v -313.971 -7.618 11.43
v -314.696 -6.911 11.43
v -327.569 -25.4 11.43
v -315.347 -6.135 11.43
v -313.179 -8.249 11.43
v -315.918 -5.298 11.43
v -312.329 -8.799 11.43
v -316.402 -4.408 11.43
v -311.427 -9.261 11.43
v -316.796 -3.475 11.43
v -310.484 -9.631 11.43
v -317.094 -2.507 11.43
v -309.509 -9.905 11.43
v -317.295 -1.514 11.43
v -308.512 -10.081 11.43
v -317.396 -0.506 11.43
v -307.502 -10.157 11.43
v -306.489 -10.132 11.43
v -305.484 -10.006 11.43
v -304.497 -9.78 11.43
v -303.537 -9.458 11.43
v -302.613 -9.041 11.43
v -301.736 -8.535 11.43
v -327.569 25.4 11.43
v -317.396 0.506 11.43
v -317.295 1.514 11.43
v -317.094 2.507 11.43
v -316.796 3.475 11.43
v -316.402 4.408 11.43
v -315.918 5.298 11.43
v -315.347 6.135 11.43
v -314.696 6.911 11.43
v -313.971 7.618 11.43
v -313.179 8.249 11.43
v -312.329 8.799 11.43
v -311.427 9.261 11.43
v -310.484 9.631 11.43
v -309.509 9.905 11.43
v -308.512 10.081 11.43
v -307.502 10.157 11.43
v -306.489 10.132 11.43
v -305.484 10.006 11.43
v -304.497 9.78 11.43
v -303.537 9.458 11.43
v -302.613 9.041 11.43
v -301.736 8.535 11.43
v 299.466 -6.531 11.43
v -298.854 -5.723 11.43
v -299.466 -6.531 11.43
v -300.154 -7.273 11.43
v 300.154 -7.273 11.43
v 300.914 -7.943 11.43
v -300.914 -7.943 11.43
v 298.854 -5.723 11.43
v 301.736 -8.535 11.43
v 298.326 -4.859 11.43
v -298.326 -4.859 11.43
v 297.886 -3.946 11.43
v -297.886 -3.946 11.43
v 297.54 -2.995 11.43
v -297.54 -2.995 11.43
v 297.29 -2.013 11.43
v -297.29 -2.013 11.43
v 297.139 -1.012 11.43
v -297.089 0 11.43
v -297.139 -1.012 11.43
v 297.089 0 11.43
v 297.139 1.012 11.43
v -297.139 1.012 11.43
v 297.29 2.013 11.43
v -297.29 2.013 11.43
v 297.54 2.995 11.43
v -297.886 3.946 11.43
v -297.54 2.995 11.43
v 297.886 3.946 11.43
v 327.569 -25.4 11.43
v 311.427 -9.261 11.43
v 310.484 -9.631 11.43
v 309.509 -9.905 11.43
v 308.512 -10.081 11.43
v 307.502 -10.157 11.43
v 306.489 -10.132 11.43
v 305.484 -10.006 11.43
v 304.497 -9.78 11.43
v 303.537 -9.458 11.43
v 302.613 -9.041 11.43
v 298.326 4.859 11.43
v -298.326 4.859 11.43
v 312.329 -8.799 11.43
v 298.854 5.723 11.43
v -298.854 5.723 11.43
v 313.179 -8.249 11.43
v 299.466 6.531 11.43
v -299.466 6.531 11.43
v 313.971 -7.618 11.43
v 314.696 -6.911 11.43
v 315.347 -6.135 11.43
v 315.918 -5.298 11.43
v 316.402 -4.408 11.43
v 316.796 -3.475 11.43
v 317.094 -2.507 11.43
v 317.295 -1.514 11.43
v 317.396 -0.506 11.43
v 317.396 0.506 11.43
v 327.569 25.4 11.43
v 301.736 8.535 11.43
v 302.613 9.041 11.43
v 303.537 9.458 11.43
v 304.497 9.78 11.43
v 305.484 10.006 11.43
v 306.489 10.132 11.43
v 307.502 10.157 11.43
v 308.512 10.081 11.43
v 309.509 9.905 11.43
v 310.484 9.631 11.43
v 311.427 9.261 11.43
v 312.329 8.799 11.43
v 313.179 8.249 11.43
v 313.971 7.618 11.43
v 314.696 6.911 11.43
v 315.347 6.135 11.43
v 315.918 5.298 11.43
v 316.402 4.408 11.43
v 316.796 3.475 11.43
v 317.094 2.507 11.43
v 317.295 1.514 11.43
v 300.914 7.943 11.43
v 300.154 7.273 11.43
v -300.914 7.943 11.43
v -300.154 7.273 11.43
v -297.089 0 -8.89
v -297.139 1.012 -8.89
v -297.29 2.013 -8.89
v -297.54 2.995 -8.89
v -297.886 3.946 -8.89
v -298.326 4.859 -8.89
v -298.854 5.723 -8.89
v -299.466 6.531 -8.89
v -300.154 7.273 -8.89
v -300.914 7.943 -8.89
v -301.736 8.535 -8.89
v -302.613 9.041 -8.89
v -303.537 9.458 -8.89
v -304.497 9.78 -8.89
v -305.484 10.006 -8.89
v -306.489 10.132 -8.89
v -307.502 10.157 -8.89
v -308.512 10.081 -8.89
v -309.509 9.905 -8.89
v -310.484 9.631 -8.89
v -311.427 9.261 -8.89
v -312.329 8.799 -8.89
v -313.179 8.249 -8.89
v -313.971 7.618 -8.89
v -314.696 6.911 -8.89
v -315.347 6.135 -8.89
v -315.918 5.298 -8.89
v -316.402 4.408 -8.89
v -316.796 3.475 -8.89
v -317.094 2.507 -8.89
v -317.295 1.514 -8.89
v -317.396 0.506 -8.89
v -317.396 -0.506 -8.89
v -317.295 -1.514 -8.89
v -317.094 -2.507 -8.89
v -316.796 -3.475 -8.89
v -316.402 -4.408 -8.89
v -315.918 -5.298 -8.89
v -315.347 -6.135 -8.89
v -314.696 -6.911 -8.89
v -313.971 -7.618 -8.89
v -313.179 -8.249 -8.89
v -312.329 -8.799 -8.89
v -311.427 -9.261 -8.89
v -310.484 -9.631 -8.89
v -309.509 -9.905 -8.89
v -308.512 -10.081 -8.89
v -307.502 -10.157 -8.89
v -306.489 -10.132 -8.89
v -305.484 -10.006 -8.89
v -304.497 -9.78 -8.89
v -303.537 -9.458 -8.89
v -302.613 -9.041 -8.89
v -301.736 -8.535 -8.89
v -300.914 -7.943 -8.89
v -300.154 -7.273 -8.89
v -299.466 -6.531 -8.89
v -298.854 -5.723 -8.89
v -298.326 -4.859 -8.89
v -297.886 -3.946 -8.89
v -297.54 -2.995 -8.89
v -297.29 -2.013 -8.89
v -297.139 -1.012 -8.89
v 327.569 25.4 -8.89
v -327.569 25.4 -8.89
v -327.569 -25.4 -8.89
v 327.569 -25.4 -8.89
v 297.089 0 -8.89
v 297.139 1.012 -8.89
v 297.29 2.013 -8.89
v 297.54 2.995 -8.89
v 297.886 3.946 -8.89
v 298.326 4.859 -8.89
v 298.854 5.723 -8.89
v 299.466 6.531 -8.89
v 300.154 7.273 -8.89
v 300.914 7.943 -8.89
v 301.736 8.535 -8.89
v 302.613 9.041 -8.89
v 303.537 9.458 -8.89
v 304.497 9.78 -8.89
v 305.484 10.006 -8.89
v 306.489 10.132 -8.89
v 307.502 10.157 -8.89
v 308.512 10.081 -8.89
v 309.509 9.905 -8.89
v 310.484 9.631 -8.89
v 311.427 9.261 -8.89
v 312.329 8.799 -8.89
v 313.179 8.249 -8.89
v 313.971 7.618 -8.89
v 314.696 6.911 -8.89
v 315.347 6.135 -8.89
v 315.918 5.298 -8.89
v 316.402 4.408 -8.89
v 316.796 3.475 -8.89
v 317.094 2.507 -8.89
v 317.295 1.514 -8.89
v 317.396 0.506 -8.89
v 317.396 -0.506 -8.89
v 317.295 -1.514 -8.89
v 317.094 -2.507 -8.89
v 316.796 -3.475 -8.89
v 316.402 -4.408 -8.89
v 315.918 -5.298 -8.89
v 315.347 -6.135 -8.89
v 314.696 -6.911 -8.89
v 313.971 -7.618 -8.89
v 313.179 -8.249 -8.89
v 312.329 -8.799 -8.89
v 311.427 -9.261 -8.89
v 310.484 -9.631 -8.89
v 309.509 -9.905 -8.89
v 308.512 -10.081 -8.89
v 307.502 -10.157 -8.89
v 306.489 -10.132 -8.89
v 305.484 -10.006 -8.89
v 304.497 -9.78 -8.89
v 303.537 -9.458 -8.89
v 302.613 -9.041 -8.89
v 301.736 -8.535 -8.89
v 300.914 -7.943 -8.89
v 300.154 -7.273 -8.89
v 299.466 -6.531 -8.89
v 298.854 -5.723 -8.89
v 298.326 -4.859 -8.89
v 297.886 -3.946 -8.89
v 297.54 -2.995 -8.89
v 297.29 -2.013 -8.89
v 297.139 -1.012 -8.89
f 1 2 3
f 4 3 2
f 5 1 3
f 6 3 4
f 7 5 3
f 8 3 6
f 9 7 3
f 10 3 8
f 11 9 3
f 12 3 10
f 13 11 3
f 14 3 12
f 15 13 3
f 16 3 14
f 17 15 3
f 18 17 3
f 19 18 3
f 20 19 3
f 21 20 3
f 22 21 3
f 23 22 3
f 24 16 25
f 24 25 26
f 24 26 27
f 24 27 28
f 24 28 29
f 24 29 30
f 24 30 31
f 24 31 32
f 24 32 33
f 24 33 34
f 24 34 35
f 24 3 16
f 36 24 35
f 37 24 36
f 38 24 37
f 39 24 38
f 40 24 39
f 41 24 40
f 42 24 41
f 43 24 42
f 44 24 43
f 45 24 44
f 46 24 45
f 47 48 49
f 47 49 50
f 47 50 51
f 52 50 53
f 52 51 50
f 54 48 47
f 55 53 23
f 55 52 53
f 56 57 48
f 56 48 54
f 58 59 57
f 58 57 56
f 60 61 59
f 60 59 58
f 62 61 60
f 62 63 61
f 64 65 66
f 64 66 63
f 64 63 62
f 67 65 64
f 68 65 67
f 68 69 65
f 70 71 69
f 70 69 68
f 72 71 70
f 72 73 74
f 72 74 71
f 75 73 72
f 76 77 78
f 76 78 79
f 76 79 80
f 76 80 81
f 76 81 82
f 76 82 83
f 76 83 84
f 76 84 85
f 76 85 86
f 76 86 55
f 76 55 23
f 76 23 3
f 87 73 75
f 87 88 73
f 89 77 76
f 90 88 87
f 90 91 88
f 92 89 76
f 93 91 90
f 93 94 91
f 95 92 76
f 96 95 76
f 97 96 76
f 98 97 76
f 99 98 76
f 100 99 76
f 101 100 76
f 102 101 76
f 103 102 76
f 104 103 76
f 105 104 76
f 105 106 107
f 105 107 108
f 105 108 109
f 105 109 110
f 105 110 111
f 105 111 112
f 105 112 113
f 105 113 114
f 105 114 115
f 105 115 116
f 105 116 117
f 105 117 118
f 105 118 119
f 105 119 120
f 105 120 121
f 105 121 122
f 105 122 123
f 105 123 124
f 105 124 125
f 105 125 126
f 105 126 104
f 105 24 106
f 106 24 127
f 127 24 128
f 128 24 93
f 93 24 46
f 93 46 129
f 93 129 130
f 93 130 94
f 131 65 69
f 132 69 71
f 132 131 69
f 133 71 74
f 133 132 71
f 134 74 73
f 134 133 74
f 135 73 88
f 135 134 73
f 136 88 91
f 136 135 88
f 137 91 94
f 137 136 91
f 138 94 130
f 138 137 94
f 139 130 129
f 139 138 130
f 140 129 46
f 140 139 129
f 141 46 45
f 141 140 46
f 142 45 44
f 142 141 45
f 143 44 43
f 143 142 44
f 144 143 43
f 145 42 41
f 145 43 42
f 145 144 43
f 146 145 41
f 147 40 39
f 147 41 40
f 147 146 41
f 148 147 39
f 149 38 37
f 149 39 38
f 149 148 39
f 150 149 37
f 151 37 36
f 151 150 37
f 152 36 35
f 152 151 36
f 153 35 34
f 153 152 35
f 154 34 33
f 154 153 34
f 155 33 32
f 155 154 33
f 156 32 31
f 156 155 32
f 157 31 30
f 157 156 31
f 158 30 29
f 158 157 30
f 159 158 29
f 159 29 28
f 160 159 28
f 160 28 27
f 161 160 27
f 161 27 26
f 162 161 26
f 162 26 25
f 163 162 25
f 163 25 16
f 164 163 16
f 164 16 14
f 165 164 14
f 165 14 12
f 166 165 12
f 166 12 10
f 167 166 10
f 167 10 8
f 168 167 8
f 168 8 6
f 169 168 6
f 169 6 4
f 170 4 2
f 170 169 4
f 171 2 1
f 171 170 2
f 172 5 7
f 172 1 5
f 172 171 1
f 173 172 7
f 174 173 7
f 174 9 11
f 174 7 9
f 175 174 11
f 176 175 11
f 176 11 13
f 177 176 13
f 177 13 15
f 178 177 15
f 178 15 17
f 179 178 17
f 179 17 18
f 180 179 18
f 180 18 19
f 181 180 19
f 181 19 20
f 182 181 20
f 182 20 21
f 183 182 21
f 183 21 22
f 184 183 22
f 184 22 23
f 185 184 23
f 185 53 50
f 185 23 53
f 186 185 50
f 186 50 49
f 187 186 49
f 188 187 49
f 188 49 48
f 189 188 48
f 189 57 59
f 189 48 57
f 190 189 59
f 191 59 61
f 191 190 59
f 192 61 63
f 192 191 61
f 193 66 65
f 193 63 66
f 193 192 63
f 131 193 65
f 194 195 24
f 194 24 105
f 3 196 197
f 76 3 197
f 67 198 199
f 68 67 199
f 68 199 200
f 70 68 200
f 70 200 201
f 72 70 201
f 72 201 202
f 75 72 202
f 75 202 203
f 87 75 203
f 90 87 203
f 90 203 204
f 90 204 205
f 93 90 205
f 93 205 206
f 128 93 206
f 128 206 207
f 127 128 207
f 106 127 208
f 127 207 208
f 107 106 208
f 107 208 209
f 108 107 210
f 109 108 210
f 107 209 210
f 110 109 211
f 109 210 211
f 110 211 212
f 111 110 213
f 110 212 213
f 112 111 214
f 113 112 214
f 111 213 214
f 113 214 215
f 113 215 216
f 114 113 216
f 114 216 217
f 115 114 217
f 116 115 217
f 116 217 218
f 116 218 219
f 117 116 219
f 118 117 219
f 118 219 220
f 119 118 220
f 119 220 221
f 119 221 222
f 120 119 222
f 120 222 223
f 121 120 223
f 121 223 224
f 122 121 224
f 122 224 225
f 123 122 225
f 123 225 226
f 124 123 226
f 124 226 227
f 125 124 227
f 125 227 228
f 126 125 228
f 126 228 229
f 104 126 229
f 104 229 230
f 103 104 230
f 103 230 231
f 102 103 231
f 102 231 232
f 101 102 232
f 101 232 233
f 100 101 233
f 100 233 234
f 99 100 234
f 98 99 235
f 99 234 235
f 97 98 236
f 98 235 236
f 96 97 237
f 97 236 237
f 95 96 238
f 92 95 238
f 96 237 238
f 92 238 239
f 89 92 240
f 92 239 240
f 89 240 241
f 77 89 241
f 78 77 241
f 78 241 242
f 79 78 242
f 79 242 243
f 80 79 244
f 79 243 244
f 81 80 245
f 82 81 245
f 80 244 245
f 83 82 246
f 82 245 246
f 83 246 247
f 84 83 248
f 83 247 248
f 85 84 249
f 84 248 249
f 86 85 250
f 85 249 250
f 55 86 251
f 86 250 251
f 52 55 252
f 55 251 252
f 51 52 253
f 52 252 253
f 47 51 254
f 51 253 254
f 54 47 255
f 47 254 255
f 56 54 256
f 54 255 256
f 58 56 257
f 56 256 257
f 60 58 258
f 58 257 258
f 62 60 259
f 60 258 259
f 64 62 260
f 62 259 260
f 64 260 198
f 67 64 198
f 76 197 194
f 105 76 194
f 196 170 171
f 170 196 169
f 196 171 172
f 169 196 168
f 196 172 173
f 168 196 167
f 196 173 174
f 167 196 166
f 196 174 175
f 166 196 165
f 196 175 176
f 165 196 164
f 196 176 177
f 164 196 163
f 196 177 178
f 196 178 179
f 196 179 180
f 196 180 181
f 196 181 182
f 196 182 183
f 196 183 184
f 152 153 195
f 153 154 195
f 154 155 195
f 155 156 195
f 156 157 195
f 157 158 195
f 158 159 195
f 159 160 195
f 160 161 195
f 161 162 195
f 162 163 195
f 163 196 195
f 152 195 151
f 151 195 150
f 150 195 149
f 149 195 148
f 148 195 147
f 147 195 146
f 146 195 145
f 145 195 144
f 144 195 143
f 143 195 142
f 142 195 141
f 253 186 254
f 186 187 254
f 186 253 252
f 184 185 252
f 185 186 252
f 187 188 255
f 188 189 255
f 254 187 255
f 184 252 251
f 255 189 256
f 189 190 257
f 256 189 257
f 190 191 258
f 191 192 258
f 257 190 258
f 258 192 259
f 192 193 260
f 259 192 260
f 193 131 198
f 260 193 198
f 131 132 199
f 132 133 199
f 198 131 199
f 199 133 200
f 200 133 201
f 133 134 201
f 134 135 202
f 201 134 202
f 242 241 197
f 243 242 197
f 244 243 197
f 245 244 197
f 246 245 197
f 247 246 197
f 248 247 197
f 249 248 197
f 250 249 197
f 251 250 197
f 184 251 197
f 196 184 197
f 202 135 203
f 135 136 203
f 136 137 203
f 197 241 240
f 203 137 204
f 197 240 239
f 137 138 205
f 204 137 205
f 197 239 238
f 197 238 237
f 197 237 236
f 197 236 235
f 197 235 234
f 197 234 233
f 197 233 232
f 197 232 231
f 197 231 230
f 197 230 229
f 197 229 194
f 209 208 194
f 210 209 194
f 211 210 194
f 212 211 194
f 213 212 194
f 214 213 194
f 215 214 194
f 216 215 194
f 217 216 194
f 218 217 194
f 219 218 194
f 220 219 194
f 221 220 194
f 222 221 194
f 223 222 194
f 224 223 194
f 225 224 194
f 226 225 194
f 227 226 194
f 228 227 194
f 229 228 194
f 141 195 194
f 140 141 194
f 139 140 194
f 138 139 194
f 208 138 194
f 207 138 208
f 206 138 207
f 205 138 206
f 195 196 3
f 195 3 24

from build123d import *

# Parameters (mm, degrees)
SKETCH1_W           = 81.89214
SKETCH1_H           = 6.35
BOSS_EXTRUDE1_DEPTH = 2.54
SKETCH3_R           = 1.27
CUT_EXTRUDE1_DEPTH  = 42.147452818
SCALE1_SCALE        = 8


with BuildPart() as part:
    # Sketch1 → Boss-Extrude1 (new body)
    with BuildSketch(Plane.XY):
        Rectangle(SKETCH1_W, SKETCH1_H)
    extrude(amount=BOSS_EXTRUDE1_DEPTH)

    # Sketch3 → Cut-Extrude1 (cut, through all)
    with BuildSketch(Plane.XY):
        with Locations((-38.40607, 0)):
            Circle(SKETCH3_R)
    cut_extrude1 = extrude(amount=CUT_EXTRUDE1_DEPTH, mode=Mode.SUBTRACT)

    # Mirror1: Cut-Extrude1 across plane
    add(cut_extrude1.mirror(Plane(origin=(0, 0, 0), x_dir=(0, 0, 1), z_dir=(1, 0, 0))), mode=Mode.SUBTRACT)


with BuildPart() as part_1:
    # Scale1: scaled about (0, 0, 1.27)
    add(part.part.scale(SCALE1_SCALE).moved(Location((0, 0, -8.89))))


solid = part_1.part
